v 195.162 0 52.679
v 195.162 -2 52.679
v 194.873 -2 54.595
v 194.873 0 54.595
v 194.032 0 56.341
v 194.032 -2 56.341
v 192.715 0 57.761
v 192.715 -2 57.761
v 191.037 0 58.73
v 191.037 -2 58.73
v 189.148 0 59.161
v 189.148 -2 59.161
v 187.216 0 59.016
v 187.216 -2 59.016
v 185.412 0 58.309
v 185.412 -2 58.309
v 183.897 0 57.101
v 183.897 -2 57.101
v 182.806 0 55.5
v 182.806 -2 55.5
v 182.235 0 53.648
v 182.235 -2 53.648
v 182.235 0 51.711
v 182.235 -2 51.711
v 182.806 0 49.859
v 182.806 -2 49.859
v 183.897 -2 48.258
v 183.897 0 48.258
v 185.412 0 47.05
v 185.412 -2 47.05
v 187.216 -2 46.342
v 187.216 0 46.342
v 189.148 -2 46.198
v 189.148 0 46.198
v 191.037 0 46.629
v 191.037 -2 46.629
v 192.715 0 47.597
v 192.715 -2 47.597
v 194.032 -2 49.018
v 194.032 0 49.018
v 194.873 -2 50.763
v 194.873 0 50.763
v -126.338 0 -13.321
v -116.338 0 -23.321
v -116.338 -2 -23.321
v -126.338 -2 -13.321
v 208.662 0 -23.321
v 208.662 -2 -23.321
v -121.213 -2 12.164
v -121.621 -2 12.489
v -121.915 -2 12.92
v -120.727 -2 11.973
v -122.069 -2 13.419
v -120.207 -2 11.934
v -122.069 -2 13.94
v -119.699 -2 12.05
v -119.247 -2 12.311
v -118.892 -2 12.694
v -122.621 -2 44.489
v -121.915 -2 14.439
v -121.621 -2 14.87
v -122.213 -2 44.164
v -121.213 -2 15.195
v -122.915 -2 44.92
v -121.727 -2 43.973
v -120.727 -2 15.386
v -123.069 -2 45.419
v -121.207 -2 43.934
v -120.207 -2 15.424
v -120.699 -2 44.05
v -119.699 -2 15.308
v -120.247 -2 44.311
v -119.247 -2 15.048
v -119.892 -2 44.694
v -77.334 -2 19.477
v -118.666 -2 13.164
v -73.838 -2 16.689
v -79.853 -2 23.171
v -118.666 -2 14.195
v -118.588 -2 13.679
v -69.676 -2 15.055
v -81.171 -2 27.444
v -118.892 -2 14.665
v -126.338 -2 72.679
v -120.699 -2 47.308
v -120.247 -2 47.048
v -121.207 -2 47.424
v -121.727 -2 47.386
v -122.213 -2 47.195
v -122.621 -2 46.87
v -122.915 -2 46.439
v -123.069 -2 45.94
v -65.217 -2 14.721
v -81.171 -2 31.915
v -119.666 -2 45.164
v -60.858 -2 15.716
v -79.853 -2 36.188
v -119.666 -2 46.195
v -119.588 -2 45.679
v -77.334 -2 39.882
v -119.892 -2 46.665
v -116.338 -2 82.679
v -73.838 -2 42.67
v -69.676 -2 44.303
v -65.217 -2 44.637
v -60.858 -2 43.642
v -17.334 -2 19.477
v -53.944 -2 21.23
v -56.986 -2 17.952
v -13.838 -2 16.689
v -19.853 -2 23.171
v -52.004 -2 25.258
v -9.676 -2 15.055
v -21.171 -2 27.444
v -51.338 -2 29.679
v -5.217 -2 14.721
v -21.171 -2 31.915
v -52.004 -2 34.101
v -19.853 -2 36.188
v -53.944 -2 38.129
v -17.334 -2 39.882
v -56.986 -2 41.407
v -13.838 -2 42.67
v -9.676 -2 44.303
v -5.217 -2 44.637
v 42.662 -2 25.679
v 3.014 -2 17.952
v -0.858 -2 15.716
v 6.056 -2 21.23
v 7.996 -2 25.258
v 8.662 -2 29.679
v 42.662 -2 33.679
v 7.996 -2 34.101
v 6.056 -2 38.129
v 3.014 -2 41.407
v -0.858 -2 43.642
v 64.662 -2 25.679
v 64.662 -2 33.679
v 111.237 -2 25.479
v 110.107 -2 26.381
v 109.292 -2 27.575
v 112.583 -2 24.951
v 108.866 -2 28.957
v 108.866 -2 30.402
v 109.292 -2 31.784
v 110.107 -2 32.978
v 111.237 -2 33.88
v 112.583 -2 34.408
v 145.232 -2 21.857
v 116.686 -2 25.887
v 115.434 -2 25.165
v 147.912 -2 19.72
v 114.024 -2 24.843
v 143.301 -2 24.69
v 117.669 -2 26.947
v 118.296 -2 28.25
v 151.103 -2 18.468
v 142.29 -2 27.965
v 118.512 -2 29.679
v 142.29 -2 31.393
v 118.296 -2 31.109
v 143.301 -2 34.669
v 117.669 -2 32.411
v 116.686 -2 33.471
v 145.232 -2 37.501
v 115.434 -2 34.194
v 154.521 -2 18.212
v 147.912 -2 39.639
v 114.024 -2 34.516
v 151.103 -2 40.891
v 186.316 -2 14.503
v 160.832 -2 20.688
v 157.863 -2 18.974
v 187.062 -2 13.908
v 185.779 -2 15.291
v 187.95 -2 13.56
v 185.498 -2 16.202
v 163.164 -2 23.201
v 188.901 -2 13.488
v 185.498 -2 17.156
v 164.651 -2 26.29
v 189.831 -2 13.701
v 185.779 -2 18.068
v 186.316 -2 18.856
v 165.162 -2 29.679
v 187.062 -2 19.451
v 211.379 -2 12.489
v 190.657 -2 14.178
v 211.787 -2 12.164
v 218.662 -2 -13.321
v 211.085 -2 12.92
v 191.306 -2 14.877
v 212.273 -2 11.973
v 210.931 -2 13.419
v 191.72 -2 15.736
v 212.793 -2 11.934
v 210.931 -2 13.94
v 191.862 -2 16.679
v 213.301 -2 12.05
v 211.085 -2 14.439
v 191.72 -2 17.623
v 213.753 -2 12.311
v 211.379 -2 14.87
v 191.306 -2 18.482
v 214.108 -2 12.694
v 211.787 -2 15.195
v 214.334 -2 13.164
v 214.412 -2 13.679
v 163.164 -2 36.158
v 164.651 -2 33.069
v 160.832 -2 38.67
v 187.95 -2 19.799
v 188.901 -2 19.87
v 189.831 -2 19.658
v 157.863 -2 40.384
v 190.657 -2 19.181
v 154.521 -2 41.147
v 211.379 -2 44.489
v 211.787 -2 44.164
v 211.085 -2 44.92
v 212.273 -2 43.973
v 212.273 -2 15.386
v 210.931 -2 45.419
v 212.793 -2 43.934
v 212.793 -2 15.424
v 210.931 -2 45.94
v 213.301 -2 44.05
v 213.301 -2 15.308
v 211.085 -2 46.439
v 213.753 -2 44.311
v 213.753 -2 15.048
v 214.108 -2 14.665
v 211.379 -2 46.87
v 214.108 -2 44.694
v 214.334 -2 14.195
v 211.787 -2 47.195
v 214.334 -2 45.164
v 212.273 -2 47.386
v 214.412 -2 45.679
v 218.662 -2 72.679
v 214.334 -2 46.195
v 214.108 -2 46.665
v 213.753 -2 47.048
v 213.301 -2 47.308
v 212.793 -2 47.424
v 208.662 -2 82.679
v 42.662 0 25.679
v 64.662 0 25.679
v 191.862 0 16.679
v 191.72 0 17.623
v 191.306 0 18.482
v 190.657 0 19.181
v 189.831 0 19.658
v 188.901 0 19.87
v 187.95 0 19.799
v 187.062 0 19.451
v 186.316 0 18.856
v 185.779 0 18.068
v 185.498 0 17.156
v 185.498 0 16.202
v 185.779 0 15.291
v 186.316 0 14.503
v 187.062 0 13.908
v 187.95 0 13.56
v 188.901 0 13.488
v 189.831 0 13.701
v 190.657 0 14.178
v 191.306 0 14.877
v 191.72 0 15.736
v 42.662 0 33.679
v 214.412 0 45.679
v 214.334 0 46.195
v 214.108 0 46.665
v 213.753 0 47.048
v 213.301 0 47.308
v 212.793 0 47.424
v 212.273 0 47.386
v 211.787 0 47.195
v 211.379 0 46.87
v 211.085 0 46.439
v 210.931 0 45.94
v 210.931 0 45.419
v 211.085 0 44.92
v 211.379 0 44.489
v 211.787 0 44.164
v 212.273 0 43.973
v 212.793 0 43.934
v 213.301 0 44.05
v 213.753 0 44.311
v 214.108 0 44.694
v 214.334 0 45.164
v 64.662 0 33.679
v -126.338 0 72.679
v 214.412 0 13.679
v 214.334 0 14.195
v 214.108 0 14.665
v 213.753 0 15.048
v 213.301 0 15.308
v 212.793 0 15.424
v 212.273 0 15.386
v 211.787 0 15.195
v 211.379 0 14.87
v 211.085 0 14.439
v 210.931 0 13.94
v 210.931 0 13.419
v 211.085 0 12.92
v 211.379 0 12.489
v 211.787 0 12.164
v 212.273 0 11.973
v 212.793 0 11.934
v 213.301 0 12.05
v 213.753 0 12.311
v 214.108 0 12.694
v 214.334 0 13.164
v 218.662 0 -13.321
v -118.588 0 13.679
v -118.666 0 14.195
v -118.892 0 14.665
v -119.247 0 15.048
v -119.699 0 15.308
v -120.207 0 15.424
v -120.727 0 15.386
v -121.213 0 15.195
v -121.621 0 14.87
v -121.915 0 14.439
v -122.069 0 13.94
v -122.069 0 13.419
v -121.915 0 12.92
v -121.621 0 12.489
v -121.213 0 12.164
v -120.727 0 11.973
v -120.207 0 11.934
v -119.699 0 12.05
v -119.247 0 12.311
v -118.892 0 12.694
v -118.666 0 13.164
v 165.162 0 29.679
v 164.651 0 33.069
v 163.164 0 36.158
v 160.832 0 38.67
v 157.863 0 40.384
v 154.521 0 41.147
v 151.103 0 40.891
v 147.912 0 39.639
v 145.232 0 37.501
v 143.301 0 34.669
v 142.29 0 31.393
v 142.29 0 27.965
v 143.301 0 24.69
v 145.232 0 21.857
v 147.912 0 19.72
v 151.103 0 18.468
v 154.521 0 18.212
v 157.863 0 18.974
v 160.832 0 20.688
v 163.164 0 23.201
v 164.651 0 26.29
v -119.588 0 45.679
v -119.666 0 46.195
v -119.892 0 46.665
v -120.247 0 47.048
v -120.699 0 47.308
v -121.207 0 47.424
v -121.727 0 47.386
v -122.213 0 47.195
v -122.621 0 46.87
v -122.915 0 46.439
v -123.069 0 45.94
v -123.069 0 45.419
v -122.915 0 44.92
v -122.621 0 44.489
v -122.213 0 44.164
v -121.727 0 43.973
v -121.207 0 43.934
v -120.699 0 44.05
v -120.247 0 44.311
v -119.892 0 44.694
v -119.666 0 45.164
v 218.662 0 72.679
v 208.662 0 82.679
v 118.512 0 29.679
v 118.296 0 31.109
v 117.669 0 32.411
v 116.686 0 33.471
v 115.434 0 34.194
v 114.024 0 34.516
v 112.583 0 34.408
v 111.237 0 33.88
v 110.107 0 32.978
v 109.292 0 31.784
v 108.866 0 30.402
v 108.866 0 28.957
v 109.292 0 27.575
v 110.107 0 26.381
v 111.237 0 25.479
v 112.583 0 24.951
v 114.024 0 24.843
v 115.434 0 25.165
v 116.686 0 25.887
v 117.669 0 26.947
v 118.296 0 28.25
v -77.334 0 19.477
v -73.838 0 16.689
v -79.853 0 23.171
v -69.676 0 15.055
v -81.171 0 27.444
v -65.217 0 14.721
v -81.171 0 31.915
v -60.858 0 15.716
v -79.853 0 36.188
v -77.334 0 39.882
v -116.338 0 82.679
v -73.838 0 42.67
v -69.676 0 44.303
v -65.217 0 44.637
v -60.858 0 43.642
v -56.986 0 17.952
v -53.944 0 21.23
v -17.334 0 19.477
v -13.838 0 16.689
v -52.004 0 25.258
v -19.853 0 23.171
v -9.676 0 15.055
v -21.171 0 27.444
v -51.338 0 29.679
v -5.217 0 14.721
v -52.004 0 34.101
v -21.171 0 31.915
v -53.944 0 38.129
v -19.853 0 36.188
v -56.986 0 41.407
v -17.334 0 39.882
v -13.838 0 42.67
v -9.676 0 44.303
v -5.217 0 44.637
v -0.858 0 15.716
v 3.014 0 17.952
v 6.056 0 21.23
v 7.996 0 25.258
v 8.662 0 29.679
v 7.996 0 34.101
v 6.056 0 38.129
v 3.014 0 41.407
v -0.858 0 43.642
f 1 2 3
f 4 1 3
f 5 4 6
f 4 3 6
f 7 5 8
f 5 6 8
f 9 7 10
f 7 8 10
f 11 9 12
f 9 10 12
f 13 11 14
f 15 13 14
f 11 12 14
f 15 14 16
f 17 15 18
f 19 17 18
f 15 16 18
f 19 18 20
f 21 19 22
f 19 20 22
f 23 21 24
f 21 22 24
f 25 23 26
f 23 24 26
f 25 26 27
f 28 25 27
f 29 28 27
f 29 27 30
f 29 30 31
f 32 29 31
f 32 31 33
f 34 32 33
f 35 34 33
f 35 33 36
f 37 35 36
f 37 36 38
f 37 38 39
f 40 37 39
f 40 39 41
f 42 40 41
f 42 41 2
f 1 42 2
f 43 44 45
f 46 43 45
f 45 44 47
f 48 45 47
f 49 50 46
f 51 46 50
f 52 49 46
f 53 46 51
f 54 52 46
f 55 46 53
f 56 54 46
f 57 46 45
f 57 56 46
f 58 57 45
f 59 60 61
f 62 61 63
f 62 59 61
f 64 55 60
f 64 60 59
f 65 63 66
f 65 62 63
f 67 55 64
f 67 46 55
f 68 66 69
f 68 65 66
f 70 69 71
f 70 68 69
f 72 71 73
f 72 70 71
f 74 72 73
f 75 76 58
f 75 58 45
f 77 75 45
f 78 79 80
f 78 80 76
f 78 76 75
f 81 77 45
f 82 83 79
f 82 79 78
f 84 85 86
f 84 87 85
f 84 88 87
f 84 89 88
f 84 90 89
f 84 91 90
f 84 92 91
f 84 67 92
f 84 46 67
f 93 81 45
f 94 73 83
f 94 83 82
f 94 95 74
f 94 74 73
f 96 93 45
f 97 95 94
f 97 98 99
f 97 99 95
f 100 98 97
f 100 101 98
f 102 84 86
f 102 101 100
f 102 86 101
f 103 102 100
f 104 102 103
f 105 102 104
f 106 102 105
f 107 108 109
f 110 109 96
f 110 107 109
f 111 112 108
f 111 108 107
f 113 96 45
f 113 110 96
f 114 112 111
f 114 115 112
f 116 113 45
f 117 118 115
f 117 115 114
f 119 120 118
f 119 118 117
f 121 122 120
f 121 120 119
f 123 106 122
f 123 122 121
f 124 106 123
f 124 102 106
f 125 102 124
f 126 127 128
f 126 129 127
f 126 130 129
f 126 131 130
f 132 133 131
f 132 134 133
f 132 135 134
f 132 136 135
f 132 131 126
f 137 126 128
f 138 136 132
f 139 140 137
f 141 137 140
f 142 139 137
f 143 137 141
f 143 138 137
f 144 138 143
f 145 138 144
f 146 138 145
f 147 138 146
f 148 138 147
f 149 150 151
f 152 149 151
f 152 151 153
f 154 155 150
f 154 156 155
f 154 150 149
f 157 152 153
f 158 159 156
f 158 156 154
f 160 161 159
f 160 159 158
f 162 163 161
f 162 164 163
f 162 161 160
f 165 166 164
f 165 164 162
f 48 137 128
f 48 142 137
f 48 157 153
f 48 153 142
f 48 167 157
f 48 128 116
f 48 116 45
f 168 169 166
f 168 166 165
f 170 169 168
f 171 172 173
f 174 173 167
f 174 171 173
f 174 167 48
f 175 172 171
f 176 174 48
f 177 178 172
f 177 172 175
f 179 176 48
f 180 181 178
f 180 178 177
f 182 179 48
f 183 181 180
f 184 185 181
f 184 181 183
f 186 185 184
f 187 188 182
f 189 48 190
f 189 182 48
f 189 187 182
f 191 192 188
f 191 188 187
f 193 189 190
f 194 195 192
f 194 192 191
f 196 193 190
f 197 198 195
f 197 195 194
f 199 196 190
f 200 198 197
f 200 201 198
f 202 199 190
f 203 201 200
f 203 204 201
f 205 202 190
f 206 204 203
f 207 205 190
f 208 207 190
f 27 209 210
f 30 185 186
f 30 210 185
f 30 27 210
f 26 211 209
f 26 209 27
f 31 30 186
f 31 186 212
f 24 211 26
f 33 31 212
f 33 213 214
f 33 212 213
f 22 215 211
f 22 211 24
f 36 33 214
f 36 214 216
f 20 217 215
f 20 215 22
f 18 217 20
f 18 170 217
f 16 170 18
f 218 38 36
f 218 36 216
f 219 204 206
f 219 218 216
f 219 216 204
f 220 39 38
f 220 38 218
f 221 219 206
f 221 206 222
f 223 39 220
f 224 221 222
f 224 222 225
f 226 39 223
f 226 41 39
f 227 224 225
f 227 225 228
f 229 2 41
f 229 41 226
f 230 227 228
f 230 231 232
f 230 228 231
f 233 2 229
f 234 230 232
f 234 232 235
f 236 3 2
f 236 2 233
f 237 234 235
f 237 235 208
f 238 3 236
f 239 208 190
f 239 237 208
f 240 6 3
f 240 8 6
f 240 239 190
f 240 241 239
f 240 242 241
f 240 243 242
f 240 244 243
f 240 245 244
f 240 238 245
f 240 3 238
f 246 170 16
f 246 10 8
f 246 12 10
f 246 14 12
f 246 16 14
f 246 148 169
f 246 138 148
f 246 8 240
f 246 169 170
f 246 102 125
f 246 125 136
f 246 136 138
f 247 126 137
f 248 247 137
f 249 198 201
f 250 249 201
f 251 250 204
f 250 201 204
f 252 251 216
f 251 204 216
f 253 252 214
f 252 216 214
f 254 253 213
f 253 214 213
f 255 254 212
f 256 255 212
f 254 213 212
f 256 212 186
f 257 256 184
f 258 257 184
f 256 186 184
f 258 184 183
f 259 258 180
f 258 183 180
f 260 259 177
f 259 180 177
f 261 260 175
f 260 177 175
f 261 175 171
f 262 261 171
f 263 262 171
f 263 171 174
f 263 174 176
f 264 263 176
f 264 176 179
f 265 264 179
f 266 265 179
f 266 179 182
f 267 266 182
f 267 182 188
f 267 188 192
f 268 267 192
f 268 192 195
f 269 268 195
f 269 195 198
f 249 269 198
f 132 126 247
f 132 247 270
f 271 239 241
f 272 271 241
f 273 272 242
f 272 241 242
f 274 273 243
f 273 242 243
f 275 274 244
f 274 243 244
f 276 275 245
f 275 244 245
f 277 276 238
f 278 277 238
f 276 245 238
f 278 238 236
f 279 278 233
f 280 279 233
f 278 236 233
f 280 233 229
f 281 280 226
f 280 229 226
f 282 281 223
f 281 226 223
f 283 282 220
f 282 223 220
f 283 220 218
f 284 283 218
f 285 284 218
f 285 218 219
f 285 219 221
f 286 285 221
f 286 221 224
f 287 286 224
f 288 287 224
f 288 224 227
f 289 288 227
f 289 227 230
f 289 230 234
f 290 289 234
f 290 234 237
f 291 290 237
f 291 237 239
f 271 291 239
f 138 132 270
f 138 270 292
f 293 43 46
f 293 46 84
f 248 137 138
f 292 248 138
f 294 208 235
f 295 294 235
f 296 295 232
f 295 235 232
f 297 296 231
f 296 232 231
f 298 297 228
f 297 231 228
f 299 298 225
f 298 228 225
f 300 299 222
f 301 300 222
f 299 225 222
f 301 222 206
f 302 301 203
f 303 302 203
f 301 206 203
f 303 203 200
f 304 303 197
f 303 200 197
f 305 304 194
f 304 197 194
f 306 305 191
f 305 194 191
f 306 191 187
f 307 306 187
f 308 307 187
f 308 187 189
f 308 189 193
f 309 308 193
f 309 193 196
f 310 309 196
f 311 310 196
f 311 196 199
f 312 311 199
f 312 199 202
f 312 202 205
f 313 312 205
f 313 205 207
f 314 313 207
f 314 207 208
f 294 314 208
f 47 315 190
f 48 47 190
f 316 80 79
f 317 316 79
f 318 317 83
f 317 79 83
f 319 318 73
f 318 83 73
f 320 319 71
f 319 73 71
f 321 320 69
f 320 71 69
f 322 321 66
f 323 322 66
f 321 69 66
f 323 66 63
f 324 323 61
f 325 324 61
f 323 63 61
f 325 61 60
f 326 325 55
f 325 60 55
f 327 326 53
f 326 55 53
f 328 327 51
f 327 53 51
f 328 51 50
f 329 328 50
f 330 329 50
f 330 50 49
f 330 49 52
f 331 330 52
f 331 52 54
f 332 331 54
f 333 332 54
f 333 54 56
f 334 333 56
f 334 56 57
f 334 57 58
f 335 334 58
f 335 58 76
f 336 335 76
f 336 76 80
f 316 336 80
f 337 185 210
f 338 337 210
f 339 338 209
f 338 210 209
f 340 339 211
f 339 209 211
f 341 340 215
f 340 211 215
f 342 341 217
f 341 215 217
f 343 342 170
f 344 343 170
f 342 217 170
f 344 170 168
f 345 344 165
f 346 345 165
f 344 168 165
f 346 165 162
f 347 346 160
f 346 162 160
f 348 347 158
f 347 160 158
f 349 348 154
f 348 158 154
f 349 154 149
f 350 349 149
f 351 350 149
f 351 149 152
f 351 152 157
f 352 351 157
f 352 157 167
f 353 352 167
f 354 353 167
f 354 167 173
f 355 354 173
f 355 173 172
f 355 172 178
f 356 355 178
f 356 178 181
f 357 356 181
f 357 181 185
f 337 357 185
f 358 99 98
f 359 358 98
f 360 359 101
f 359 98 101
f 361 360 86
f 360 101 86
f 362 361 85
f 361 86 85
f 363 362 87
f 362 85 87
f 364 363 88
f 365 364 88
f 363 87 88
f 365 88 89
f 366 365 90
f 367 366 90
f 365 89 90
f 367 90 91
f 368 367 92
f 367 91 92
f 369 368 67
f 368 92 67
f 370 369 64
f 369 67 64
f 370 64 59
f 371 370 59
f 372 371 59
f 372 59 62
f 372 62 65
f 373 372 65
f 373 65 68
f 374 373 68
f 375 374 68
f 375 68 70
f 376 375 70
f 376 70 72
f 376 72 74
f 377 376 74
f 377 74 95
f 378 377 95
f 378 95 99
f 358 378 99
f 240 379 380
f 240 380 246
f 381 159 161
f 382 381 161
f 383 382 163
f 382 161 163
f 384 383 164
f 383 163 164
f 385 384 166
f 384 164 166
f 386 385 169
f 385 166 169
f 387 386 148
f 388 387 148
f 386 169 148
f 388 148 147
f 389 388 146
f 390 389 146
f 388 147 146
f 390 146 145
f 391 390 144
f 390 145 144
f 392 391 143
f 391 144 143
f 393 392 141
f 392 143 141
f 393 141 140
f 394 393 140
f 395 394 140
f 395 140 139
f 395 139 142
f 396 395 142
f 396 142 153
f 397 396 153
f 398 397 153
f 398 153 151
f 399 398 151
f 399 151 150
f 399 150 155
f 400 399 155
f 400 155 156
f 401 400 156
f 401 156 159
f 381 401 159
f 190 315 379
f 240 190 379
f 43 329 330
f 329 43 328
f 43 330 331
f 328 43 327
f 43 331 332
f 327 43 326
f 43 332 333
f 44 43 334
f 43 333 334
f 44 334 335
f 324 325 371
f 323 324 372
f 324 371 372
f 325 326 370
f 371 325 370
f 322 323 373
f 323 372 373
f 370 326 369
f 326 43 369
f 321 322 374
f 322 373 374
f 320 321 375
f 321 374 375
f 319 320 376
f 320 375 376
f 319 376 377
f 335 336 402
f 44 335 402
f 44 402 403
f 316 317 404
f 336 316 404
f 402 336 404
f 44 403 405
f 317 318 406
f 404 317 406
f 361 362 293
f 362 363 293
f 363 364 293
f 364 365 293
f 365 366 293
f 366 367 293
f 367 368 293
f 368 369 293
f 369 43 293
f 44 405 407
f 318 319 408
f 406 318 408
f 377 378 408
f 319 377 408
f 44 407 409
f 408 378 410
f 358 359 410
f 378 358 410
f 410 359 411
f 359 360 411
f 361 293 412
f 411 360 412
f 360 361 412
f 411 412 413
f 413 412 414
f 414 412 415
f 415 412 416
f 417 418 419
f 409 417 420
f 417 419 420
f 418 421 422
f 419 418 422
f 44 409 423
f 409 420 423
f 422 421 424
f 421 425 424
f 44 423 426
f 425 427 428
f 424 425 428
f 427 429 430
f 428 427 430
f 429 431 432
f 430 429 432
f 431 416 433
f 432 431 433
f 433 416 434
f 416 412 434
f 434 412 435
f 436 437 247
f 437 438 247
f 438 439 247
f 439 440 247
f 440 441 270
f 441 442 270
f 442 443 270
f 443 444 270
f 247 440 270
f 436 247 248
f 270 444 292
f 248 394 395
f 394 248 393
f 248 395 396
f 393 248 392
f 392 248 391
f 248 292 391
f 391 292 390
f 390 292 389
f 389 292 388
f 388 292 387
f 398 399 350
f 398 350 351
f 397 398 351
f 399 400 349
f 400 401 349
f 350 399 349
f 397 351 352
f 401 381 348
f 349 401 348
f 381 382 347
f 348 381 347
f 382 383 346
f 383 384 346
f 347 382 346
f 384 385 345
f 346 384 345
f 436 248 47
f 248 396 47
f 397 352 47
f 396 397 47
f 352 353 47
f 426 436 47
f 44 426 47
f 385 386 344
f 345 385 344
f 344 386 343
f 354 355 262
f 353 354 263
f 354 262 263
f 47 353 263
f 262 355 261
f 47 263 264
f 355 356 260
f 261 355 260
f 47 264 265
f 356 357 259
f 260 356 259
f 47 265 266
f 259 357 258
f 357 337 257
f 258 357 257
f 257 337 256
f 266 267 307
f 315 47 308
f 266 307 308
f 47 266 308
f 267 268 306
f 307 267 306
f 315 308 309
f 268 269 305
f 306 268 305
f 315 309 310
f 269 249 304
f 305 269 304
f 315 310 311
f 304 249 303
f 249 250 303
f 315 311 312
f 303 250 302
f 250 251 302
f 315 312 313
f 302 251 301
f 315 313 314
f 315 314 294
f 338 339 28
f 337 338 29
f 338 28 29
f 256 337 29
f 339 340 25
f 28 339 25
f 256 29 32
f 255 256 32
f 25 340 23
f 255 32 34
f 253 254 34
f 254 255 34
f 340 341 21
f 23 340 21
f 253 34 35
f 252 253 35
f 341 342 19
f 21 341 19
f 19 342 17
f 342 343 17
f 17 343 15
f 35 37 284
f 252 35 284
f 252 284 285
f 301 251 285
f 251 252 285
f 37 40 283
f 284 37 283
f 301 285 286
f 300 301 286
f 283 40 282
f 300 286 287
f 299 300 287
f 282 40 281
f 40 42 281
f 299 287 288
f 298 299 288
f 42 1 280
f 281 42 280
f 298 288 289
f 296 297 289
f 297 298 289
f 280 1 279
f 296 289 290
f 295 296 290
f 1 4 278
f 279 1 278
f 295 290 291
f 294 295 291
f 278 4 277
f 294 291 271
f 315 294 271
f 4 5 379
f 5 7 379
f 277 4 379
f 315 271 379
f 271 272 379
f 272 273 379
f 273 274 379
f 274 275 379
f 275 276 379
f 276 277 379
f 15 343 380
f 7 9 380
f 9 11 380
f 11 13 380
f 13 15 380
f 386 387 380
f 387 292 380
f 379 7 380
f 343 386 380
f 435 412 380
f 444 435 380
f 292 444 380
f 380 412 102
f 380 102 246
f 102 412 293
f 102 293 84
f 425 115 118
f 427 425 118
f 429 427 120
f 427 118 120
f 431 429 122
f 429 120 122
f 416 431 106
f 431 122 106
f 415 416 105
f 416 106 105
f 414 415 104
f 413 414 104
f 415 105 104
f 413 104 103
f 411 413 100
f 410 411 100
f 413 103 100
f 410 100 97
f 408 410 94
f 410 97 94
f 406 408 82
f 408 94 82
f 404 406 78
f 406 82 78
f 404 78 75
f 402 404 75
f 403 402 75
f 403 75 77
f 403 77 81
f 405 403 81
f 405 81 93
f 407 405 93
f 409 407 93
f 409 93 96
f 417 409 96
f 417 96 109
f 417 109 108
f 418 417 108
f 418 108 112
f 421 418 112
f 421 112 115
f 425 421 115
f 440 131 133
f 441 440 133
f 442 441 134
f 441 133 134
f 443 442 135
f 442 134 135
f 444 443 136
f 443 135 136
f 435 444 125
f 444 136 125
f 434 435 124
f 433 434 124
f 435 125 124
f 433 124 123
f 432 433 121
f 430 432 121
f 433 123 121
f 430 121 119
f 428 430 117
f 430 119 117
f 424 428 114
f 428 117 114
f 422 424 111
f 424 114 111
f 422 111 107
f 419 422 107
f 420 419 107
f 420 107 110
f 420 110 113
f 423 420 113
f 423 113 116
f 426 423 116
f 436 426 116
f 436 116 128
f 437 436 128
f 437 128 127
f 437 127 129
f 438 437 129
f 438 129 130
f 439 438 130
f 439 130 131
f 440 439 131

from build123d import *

# Parameters (mm, degrees)
F0_W      = 345
F0_H      = 106
F1_DEPTH  = 2
F2_SIZE   = 10
F3_SIZE   = 10
F4_R      = 1.75
F5_DEPTH  = 25
F6_R      = 15
F6_W      = 22
F6_H      = 8
F7_DEPTH  = 25
F9_R      = 6.5
F9_R_2    = 11.5
F9_R_3    = 3.2
F10_DEPTH = 25
F6_R_2    = 4.85
F11_DEPTH = 25


# Not quite as in the source:
# - a feature names something its author has since deleted; it is built from what else it names


with BuildPart() as f1:
    # F0 (on Front) → F1 (new body)
    with BuildSketch(Plane.XZ):
        with Locations((46.1619326359, 29.679378029)):
            Rectangle(F0_W, F0_H)
    extrude(amount=F1_DEPTH)

    # F2
    f2_edges = [f1.edges().sort_by_distance(p)[0] for p in [
        (-126.338067, -1, 82.679378),
    ]]
    chamfer(f2_edges, length=F2_SIZE)

    # F3
    f3_edges = [f1.edges().sort_by_distance(p)[0] for p in [
        (-126.338067, -1, -23.320622),
        (218.661933, -1, -23.320622),
        (218.661933, -1, 82.679378),
    ]]
    chamfer(f3_edges, length=F3_SIZE)

    # F4 (on face) → F5 (cut)
    with BuildSketch(Plane.XZ.offset(2)):
        with Locations((-121.3380673641, 45.679378029)):
            Circle(F4_R)
        with Locations((-120.3380673641, 13.679378029)):
            Circle(F4_R)
        with Locations((212.6619326359, 45.679378029)):
            Circle(F4_R)
        with Locations((212.6619326359, 13.679378029)):
            Circle(F4_R)
    extrude(amount=-F5_DEPTH, mode=Mode.SUBTRACT)

    # F6 (on face) → F7 (cut)
    with BuildSketch(Plane.XZ.offset(2)):
        with Locations((-66.3380673641, 29.679378029)):
            Circle(F6_R)
        with Locations((-6.3380673641, 29.679378029)):
            Circle(F6_R)
        with Locations((53.6619326359, 29.679378029)):
            Rectangle(F6_W, F6_H)
    extrude(amount=-F7_DEPTH, mode=Mode.SUBTRACT)

    # F9 (on face) → F10 (cut)
    with BuildSketch(Plane.XZ.offset(2)):
        with Locations((188.6619326359, 52.679378029)):
            Circle(F9_R)
        with Locations((153.6619326359, 29.679378029)):
            Circle(F9_R_2)
        with Locations((188.6619326359, 16.679378029)):
            Circle(F9_R_3)
    extrude(amount=-F10_DEPTH, mode=Mode.SUBTRACT)

    # F6 (on face) → F11 (cut)
    with BuildSketch(Plane.XZ.offset(2)):
        with Locations((-66.3380673641, 29.679378029)):
            Circle(F6_R)
        with Locations((-6.3380673641, 29.679378029)):
            Circle(F6_R)
        with Locations((53.6619326359, 29.679378029)):
            Rectangle(F6_W, F6_H)
        with Locations((113.6619326359, 29.679378029)):
            Circle(F6_R_2)
    extrude(amount=-F11_DEPTH, mode=Mode.SUBTRACT)


solid = f1.part
